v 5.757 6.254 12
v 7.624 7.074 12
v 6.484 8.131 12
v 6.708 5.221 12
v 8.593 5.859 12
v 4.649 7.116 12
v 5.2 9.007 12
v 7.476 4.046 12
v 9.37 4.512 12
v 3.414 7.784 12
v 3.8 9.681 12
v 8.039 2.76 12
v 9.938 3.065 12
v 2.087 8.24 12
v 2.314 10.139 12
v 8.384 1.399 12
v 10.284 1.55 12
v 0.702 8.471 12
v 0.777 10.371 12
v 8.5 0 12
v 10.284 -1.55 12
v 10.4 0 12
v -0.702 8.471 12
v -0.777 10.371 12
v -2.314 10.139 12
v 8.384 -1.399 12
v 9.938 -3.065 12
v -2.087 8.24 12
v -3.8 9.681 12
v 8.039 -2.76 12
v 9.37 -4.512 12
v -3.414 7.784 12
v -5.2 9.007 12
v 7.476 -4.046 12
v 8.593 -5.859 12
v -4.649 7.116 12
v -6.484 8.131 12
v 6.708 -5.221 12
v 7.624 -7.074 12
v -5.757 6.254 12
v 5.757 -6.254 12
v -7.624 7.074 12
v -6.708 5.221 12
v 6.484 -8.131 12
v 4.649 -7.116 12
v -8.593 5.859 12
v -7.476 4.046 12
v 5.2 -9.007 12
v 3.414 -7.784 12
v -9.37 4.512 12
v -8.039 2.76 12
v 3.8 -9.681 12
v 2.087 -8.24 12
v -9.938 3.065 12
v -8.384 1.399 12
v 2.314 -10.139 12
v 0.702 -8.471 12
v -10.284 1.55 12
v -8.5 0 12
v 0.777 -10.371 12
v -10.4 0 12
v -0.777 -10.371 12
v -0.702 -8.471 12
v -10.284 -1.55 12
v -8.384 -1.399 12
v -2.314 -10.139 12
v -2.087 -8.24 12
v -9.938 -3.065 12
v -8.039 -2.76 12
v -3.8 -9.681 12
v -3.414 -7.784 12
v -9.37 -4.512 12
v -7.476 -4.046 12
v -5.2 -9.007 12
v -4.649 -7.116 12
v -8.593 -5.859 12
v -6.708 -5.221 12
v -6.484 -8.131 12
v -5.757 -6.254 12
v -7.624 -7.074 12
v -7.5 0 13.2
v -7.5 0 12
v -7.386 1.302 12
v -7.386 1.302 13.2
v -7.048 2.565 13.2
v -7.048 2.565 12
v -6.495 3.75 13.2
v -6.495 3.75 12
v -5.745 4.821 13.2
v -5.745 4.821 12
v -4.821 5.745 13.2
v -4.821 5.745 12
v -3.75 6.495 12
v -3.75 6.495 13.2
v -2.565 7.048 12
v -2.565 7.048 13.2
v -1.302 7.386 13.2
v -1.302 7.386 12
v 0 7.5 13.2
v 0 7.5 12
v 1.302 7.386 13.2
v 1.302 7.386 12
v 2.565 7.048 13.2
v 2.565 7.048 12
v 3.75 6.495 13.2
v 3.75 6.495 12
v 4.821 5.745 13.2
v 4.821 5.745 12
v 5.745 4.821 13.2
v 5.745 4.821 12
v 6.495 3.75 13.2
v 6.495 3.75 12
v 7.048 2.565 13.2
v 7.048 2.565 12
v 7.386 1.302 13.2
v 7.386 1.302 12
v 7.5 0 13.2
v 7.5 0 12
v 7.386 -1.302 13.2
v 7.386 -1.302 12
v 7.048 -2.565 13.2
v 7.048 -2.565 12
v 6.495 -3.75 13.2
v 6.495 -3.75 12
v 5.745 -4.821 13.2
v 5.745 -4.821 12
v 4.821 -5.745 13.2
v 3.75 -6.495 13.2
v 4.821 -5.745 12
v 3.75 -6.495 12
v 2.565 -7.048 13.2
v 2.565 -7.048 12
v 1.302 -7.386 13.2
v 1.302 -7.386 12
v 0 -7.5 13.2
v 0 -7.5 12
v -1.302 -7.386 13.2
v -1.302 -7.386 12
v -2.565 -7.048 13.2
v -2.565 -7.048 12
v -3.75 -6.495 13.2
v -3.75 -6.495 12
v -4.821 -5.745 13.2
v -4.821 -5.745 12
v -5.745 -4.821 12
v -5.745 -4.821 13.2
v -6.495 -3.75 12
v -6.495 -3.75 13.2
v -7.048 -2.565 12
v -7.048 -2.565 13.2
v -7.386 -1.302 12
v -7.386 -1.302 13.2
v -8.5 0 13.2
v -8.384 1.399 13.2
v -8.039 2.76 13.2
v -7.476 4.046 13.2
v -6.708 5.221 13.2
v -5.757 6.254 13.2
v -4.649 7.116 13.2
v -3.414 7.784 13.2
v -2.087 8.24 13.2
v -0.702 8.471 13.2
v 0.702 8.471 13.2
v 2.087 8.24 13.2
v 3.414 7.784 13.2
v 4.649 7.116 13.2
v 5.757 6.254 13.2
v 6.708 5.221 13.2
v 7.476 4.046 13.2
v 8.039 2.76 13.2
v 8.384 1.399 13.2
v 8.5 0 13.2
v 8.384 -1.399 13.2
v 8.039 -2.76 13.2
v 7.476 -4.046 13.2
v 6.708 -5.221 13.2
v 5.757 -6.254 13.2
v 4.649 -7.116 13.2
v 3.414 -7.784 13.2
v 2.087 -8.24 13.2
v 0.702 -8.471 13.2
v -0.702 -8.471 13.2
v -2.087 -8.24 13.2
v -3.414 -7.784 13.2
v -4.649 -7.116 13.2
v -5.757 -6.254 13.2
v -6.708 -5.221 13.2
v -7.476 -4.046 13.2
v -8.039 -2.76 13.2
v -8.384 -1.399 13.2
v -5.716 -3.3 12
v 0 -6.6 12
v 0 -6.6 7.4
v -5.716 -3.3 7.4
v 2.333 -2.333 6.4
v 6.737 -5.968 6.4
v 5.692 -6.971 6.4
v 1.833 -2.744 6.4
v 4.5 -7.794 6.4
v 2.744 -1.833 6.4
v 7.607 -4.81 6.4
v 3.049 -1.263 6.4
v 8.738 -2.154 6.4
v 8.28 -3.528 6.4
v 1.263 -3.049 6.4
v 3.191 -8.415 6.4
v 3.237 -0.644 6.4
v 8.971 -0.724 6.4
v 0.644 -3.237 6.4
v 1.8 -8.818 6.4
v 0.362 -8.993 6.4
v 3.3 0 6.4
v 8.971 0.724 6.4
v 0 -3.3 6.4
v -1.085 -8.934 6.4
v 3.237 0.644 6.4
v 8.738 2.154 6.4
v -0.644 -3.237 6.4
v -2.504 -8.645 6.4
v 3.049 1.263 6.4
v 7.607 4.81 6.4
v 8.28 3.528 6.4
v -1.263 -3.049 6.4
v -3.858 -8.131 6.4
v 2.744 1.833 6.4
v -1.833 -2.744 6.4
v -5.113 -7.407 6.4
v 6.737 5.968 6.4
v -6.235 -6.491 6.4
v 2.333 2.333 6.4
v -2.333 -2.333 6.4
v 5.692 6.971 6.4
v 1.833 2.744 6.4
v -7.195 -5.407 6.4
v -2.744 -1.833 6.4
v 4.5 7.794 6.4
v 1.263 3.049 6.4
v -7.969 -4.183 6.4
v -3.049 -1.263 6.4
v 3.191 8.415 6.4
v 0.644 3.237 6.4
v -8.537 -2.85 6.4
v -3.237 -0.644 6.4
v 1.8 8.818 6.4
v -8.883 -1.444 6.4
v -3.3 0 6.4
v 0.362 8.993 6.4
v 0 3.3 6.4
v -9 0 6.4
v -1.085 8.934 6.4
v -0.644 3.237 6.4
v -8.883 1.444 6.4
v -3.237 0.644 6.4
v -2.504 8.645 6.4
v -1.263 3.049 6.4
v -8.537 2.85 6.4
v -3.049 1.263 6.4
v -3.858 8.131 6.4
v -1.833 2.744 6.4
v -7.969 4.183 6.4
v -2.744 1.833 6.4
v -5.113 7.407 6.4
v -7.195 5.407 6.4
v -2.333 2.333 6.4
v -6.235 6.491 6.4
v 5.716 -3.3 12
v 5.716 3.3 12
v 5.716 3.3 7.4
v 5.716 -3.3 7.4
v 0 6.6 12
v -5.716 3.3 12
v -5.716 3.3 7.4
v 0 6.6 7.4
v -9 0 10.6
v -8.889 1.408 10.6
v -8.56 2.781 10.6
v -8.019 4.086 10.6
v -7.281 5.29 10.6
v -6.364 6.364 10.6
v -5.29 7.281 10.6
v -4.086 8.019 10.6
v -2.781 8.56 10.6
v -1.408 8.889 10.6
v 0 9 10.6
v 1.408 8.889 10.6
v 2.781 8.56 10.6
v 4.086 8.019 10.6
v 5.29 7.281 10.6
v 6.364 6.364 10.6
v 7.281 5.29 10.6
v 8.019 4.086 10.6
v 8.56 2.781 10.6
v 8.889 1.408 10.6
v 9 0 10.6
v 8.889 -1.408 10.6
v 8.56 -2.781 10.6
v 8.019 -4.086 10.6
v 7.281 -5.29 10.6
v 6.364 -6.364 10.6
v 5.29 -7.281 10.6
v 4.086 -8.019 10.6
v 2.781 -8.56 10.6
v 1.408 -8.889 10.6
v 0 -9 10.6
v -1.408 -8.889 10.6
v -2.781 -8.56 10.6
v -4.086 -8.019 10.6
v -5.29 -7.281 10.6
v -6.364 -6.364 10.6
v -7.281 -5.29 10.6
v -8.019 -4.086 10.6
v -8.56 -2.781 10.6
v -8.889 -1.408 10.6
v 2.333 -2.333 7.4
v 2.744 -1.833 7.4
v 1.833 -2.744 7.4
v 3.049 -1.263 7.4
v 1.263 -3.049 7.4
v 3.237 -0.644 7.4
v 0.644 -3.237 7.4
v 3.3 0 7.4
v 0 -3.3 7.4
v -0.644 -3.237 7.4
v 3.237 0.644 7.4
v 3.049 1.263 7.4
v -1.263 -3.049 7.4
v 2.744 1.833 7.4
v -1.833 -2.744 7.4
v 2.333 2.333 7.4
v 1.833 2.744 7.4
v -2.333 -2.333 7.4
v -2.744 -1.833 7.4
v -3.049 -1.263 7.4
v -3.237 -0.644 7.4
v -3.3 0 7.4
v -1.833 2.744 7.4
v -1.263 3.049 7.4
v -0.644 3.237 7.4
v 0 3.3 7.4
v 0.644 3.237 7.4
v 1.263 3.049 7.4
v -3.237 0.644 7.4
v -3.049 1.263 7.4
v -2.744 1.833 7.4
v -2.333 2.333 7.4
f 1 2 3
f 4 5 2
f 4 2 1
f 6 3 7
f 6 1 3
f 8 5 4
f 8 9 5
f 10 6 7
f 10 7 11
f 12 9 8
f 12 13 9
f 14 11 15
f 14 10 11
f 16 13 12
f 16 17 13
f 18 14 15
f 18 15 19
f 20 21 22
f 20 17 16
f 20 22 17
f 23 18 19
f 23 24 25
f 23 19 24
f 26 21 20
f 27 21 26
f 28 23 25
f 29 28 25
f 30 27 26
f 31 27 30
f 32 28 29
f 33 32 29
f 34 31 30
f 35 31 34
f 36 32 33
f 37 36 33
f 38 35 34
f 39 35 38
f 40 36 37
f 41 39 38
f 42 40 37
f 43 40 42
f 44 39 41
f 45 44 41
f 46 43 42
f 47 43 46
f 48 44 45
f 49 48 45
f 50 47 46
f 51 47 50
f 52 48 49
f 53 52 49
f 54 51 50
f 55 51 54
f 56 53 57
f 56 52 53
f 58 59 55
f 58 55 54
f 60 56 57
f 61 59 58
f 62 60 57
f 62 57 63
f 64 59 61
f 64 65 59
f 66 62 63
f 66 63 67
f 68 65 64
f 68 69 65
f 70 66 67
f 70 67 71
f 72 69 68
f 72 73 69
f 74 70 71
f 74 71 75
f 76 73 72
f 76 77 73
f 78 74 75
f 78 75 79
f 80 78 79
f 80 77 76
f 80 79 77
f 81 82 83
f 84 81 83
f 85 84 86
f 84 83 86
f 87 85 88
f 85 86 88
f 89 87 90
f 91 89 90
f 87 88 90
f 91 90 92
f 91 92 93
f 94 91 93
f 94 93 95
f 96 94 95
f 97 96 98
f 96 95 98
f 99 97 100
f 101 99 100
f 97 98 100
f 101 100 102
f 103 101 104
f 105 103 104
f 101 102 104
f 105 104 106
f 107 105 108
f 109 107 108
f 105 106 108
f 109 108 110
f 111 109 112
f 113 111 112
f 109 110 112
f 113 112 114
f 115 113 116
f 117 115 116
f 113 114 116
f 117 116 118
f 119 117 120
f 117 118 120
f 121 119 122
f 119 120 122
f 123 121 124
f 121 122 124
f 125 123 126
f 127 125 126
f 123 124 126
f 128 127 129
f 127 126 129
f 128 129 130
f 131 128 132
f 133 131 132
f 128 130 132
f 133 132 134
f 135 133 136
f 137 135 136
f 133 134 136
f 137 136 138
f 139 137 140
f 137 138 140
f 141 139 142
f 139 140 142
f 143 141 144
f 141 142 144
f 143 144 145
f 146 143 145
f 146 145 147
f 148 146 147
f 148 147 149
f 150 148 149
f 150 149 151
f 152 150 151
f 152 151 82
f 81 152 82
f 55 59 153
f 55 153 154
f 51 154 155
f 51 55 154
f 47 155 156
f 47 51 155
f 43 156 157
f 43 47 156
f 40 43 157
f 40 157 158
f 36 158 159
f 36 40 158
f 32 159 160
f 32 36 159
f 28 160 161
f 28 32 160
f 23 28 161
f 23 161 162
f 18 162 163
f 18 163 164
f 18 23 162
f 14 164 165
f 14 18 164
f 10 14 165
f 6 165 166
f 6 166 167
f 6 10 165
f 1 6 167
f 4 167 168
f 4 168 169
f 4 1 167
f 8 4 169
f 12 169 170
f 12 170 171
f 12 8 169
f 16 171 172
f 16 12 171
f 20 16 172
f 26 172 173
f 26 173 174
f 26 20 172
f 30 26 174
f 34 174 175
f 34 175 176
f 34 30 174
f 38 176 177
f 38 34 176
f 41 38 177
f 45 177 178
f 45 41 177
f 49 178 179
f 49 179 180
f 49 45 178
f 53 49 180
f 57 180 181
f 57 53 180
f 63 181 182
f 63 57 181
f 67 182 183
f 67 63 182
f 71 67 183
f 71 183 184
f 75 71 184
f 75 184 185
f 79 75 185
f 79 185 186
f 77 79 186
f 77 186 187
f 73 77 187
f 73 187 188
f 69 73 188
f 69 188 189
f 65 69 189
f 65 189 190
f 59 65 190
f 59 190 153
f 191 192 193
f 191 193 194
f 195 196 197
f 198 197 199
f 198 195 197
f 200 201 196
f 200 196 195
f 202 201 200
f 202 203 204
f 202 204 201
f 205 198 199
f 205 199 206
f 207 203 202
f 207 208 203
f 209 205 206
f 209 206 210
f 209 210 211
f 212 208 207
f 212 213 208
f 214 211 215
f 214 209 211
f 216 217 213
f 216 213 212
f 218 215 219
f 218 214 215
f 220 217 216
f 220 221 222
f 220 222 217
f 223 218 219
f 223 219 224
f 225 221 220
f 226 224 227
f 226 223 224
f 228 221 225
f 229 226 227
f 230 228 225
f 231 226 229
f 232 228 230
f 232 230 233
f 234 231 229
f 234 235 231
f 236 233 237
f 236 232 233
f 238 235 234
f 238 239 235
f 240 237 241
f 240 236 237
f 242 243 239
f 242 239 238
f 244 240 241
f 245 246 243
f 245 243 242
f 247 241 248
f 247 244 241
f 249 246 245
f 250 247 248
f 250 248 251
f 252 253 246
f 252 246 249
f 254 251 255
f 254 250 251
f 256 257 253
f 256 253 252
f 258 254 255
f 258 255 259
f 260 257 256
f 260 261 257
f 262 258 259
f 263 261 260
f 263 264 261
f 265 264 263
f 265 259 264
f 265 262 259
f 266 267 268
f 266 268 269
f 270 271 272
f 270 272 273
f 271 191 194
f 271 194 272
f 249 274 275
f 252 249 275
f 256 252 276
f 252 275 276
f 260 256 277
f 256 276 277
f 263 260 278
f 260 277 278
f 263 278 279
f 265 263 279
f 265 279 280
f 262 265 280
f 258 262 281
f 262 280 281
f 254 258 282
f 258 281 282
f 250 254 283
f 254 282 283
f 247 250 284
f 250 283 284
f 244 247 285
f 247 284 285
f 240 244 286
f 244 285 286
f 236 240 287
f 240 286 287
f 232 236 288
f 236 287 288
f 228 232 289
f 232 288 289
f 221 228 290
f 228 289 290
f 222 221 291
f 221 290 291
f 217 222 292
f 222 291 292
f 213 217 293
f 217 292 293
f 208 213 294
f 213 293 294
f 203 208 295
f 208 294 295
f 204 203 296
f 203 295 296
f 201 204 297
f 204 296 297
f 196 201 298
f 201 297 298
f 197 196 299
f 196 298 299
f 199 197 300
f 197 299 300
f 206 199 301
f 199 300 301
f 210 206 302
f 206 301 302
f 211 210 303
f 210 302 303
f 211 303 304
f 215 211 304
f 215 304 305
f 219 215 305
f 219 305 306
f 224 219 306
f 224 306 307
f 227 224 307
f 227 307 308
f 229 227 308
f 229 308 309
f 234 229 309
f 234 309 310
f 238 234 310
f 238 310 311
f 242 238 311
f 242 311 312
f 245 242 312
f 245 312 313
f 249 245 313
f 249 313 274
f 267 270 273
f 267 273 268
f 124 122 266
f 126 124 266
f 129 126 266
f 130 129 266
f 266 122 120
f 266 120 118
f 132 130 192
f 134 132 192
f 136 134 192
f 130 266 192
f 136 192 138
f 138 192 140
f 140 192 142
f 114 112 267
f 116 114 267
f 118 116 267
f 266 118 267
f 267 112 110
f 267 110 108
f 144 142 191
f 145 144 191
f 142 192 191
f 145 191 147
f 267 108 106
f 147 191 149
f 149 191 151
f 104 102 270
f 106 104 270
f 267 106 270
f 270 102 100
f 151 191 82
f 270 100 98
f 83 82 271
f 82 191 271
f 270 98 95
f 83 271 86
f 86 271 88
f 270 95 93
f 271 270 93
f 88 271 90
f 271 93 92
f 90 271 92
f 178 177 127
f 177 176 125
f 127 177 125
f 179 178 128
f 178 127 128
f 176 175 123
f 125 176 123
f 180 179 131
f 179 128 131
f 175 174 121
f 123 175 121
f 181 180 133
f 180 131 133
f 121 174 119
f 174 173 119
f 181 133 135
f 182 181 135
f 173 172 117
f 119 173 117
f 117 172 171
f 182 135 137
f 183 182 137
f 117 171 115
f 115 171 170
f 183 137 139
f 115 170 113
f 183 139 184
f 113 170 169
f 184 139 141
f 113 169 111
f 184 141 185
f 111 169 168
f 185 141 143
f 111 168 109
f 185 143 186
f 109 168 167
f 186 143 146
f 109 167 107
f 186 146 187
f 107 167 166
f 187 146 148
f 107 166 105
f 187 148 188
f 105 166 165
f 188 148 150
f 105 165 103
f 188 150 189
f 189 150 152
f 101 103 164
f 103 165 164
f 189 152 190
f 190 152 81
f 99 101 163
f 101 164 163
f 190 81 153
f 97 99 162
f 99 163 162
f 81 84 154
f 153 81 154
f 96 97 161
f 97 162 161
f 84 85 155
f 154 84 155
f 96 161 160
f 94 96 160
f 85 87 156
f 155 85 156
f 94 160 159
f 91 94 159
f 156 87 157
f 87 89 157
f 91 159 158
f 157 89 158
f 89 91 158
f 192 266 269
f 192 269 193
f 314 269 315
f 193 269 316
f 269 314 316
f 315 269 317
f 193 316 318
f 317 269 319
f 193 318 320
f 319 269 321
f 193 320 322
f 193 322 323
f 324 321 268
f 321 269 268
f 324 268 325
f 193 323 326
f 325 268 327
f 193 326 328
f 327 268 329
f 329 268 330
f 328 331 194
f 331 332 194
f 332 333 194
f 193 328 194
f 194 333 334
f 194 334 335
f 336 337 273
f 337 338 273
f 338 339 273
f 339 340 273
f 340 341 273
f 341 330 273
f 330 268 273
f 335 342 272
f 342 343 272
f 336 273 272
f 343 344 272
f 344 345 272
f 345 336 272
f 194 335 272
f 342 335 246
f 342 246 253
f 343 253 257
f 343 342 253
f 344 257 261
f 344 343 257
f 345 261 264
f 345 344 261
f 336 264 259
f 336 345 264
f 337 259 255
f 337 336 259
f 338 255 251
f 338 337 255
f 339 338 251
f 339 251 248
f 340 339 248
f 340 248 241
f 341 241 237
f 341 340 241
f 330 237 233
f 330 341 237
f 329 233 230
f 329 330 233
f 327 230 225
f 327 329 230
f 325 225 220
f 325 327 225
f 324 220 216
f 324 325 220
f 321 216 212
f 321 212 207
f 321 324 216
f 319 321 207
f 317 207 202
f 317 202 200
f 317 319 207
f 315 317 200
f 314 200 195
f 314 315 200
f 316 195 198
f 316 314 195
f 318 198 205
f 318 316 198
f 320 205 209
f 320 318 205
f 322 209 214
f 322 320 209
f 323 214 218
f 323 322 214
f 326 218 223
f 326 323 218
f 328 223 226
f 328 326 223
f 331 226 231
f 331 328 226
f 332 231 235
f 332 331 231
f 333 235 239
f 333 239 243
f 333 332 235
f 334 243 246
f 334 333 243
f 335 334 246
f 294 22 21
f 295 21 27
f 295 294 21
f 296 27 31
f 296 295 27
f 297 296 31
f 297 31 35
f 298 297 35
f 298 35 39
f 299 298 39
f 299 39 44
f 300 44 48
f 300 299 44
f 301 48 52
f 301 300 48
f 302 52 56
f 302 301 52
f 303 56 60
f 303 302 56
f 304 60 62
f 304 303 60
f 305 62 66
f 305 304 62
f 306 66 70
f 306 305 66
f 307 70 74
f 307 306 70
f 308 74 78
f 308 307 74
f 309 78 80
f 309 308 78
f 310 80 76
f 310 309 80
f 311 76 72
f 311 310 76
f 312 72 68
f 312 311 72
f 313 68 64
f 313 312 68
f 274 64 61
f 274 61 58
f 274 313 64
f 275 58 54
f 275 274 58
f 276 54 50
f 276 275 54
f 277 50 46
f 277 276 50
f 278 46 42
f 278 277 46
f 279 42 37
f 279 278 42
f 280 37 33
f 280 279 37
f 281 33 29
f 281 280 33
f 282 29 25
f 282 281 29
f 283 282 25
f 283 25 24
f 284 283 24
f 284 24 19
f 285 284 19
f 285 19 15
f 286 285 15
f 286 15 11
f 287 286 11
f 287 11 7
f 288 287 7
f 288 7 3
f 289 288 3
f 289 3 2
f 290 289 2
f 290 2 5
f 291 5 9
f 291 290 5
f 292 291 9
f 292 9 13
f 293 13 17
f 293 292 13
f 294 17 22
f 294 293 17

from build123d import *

# Parameters (mm, degrees)
SKETCH002_R             = 9
SKETCH002_R_2           = 3.3
EXTRUDE001_DEPTH        = 1
SKETCH003_R             = 8.5
SKETCH003_R_2           = 7.5
EXTRUDE003_DEPTH        = 1.2
SKETCH001_R             = 9
EXTRUDE002_DEPTH        = 4.6
BODY003_PLACEMENT_ANGLE = 180


with BuildPart() as extrude001:
    # Sketch002 → Extrude001 (new body)
    with BuildSketch(Plane.XY):
        Circle(SKETCH002_R)
        Circle(SKETCH002_R_2, mode=Mode.SUBTRACT)
    extrude(amount=EXTRUDE001_DEPTH)


with BuildPart() as extrude001_1:
    # Extrude001 placement: moved
    add(extrude001.part.moved(Location((0, 0, 4.6))))


with BuildPart() as extrude003:
    # Sketch003 → Extrude003 (new body)
    with BuildSketch(Plane.XY):
        Circle(SKETCH003_R)
        Circle(SKETCH003_R_2, mode=Mode.SUBTRACT)
    extrude(amount=-EXTRUDE003_DEPTH)


with BuildPart() as revolve_body:
    # Sketch007 → Revolve (revolve)
    with BuildSketch(Plane.XZ):
        Polygon((-9, 1.4), (-9, 0), (-10.4, 0), align=None)
    revolve(axis=Axis((0, 0, 0), (0, 0, 1)))


with BuildPart() as body003:
    # Sketch001 → Extrude002 (new body)
    with BuildSketch(Plane.XY):
        Circle(SKETCH001_R)
        Polygon((5.715768, 3.3), (0, 6.6), (-5.715768, 3.3), (-5.715768, -3.3), (0, -6.6), (5.715768, -3.3), align=None, mode=Mode.SUBTRACT)
    extrude(amount=EXTRUDE002_DEPTH)

    # Fusion: union Extrude001, Extrude003, Revolve body
    add(extrude001_1.part)
    add(extrude003.part)
    add(revolve_body.part)


with BuildPart() as body003_1:
    # Body003 placement: moved
    add(body003.part.moved(Location((0, 0, 12))).rotate(Axis((0, 0, 12), (0, 1, 0)), BODY003_PLACEMENT_ANGLE))


solid = body003_1.part
